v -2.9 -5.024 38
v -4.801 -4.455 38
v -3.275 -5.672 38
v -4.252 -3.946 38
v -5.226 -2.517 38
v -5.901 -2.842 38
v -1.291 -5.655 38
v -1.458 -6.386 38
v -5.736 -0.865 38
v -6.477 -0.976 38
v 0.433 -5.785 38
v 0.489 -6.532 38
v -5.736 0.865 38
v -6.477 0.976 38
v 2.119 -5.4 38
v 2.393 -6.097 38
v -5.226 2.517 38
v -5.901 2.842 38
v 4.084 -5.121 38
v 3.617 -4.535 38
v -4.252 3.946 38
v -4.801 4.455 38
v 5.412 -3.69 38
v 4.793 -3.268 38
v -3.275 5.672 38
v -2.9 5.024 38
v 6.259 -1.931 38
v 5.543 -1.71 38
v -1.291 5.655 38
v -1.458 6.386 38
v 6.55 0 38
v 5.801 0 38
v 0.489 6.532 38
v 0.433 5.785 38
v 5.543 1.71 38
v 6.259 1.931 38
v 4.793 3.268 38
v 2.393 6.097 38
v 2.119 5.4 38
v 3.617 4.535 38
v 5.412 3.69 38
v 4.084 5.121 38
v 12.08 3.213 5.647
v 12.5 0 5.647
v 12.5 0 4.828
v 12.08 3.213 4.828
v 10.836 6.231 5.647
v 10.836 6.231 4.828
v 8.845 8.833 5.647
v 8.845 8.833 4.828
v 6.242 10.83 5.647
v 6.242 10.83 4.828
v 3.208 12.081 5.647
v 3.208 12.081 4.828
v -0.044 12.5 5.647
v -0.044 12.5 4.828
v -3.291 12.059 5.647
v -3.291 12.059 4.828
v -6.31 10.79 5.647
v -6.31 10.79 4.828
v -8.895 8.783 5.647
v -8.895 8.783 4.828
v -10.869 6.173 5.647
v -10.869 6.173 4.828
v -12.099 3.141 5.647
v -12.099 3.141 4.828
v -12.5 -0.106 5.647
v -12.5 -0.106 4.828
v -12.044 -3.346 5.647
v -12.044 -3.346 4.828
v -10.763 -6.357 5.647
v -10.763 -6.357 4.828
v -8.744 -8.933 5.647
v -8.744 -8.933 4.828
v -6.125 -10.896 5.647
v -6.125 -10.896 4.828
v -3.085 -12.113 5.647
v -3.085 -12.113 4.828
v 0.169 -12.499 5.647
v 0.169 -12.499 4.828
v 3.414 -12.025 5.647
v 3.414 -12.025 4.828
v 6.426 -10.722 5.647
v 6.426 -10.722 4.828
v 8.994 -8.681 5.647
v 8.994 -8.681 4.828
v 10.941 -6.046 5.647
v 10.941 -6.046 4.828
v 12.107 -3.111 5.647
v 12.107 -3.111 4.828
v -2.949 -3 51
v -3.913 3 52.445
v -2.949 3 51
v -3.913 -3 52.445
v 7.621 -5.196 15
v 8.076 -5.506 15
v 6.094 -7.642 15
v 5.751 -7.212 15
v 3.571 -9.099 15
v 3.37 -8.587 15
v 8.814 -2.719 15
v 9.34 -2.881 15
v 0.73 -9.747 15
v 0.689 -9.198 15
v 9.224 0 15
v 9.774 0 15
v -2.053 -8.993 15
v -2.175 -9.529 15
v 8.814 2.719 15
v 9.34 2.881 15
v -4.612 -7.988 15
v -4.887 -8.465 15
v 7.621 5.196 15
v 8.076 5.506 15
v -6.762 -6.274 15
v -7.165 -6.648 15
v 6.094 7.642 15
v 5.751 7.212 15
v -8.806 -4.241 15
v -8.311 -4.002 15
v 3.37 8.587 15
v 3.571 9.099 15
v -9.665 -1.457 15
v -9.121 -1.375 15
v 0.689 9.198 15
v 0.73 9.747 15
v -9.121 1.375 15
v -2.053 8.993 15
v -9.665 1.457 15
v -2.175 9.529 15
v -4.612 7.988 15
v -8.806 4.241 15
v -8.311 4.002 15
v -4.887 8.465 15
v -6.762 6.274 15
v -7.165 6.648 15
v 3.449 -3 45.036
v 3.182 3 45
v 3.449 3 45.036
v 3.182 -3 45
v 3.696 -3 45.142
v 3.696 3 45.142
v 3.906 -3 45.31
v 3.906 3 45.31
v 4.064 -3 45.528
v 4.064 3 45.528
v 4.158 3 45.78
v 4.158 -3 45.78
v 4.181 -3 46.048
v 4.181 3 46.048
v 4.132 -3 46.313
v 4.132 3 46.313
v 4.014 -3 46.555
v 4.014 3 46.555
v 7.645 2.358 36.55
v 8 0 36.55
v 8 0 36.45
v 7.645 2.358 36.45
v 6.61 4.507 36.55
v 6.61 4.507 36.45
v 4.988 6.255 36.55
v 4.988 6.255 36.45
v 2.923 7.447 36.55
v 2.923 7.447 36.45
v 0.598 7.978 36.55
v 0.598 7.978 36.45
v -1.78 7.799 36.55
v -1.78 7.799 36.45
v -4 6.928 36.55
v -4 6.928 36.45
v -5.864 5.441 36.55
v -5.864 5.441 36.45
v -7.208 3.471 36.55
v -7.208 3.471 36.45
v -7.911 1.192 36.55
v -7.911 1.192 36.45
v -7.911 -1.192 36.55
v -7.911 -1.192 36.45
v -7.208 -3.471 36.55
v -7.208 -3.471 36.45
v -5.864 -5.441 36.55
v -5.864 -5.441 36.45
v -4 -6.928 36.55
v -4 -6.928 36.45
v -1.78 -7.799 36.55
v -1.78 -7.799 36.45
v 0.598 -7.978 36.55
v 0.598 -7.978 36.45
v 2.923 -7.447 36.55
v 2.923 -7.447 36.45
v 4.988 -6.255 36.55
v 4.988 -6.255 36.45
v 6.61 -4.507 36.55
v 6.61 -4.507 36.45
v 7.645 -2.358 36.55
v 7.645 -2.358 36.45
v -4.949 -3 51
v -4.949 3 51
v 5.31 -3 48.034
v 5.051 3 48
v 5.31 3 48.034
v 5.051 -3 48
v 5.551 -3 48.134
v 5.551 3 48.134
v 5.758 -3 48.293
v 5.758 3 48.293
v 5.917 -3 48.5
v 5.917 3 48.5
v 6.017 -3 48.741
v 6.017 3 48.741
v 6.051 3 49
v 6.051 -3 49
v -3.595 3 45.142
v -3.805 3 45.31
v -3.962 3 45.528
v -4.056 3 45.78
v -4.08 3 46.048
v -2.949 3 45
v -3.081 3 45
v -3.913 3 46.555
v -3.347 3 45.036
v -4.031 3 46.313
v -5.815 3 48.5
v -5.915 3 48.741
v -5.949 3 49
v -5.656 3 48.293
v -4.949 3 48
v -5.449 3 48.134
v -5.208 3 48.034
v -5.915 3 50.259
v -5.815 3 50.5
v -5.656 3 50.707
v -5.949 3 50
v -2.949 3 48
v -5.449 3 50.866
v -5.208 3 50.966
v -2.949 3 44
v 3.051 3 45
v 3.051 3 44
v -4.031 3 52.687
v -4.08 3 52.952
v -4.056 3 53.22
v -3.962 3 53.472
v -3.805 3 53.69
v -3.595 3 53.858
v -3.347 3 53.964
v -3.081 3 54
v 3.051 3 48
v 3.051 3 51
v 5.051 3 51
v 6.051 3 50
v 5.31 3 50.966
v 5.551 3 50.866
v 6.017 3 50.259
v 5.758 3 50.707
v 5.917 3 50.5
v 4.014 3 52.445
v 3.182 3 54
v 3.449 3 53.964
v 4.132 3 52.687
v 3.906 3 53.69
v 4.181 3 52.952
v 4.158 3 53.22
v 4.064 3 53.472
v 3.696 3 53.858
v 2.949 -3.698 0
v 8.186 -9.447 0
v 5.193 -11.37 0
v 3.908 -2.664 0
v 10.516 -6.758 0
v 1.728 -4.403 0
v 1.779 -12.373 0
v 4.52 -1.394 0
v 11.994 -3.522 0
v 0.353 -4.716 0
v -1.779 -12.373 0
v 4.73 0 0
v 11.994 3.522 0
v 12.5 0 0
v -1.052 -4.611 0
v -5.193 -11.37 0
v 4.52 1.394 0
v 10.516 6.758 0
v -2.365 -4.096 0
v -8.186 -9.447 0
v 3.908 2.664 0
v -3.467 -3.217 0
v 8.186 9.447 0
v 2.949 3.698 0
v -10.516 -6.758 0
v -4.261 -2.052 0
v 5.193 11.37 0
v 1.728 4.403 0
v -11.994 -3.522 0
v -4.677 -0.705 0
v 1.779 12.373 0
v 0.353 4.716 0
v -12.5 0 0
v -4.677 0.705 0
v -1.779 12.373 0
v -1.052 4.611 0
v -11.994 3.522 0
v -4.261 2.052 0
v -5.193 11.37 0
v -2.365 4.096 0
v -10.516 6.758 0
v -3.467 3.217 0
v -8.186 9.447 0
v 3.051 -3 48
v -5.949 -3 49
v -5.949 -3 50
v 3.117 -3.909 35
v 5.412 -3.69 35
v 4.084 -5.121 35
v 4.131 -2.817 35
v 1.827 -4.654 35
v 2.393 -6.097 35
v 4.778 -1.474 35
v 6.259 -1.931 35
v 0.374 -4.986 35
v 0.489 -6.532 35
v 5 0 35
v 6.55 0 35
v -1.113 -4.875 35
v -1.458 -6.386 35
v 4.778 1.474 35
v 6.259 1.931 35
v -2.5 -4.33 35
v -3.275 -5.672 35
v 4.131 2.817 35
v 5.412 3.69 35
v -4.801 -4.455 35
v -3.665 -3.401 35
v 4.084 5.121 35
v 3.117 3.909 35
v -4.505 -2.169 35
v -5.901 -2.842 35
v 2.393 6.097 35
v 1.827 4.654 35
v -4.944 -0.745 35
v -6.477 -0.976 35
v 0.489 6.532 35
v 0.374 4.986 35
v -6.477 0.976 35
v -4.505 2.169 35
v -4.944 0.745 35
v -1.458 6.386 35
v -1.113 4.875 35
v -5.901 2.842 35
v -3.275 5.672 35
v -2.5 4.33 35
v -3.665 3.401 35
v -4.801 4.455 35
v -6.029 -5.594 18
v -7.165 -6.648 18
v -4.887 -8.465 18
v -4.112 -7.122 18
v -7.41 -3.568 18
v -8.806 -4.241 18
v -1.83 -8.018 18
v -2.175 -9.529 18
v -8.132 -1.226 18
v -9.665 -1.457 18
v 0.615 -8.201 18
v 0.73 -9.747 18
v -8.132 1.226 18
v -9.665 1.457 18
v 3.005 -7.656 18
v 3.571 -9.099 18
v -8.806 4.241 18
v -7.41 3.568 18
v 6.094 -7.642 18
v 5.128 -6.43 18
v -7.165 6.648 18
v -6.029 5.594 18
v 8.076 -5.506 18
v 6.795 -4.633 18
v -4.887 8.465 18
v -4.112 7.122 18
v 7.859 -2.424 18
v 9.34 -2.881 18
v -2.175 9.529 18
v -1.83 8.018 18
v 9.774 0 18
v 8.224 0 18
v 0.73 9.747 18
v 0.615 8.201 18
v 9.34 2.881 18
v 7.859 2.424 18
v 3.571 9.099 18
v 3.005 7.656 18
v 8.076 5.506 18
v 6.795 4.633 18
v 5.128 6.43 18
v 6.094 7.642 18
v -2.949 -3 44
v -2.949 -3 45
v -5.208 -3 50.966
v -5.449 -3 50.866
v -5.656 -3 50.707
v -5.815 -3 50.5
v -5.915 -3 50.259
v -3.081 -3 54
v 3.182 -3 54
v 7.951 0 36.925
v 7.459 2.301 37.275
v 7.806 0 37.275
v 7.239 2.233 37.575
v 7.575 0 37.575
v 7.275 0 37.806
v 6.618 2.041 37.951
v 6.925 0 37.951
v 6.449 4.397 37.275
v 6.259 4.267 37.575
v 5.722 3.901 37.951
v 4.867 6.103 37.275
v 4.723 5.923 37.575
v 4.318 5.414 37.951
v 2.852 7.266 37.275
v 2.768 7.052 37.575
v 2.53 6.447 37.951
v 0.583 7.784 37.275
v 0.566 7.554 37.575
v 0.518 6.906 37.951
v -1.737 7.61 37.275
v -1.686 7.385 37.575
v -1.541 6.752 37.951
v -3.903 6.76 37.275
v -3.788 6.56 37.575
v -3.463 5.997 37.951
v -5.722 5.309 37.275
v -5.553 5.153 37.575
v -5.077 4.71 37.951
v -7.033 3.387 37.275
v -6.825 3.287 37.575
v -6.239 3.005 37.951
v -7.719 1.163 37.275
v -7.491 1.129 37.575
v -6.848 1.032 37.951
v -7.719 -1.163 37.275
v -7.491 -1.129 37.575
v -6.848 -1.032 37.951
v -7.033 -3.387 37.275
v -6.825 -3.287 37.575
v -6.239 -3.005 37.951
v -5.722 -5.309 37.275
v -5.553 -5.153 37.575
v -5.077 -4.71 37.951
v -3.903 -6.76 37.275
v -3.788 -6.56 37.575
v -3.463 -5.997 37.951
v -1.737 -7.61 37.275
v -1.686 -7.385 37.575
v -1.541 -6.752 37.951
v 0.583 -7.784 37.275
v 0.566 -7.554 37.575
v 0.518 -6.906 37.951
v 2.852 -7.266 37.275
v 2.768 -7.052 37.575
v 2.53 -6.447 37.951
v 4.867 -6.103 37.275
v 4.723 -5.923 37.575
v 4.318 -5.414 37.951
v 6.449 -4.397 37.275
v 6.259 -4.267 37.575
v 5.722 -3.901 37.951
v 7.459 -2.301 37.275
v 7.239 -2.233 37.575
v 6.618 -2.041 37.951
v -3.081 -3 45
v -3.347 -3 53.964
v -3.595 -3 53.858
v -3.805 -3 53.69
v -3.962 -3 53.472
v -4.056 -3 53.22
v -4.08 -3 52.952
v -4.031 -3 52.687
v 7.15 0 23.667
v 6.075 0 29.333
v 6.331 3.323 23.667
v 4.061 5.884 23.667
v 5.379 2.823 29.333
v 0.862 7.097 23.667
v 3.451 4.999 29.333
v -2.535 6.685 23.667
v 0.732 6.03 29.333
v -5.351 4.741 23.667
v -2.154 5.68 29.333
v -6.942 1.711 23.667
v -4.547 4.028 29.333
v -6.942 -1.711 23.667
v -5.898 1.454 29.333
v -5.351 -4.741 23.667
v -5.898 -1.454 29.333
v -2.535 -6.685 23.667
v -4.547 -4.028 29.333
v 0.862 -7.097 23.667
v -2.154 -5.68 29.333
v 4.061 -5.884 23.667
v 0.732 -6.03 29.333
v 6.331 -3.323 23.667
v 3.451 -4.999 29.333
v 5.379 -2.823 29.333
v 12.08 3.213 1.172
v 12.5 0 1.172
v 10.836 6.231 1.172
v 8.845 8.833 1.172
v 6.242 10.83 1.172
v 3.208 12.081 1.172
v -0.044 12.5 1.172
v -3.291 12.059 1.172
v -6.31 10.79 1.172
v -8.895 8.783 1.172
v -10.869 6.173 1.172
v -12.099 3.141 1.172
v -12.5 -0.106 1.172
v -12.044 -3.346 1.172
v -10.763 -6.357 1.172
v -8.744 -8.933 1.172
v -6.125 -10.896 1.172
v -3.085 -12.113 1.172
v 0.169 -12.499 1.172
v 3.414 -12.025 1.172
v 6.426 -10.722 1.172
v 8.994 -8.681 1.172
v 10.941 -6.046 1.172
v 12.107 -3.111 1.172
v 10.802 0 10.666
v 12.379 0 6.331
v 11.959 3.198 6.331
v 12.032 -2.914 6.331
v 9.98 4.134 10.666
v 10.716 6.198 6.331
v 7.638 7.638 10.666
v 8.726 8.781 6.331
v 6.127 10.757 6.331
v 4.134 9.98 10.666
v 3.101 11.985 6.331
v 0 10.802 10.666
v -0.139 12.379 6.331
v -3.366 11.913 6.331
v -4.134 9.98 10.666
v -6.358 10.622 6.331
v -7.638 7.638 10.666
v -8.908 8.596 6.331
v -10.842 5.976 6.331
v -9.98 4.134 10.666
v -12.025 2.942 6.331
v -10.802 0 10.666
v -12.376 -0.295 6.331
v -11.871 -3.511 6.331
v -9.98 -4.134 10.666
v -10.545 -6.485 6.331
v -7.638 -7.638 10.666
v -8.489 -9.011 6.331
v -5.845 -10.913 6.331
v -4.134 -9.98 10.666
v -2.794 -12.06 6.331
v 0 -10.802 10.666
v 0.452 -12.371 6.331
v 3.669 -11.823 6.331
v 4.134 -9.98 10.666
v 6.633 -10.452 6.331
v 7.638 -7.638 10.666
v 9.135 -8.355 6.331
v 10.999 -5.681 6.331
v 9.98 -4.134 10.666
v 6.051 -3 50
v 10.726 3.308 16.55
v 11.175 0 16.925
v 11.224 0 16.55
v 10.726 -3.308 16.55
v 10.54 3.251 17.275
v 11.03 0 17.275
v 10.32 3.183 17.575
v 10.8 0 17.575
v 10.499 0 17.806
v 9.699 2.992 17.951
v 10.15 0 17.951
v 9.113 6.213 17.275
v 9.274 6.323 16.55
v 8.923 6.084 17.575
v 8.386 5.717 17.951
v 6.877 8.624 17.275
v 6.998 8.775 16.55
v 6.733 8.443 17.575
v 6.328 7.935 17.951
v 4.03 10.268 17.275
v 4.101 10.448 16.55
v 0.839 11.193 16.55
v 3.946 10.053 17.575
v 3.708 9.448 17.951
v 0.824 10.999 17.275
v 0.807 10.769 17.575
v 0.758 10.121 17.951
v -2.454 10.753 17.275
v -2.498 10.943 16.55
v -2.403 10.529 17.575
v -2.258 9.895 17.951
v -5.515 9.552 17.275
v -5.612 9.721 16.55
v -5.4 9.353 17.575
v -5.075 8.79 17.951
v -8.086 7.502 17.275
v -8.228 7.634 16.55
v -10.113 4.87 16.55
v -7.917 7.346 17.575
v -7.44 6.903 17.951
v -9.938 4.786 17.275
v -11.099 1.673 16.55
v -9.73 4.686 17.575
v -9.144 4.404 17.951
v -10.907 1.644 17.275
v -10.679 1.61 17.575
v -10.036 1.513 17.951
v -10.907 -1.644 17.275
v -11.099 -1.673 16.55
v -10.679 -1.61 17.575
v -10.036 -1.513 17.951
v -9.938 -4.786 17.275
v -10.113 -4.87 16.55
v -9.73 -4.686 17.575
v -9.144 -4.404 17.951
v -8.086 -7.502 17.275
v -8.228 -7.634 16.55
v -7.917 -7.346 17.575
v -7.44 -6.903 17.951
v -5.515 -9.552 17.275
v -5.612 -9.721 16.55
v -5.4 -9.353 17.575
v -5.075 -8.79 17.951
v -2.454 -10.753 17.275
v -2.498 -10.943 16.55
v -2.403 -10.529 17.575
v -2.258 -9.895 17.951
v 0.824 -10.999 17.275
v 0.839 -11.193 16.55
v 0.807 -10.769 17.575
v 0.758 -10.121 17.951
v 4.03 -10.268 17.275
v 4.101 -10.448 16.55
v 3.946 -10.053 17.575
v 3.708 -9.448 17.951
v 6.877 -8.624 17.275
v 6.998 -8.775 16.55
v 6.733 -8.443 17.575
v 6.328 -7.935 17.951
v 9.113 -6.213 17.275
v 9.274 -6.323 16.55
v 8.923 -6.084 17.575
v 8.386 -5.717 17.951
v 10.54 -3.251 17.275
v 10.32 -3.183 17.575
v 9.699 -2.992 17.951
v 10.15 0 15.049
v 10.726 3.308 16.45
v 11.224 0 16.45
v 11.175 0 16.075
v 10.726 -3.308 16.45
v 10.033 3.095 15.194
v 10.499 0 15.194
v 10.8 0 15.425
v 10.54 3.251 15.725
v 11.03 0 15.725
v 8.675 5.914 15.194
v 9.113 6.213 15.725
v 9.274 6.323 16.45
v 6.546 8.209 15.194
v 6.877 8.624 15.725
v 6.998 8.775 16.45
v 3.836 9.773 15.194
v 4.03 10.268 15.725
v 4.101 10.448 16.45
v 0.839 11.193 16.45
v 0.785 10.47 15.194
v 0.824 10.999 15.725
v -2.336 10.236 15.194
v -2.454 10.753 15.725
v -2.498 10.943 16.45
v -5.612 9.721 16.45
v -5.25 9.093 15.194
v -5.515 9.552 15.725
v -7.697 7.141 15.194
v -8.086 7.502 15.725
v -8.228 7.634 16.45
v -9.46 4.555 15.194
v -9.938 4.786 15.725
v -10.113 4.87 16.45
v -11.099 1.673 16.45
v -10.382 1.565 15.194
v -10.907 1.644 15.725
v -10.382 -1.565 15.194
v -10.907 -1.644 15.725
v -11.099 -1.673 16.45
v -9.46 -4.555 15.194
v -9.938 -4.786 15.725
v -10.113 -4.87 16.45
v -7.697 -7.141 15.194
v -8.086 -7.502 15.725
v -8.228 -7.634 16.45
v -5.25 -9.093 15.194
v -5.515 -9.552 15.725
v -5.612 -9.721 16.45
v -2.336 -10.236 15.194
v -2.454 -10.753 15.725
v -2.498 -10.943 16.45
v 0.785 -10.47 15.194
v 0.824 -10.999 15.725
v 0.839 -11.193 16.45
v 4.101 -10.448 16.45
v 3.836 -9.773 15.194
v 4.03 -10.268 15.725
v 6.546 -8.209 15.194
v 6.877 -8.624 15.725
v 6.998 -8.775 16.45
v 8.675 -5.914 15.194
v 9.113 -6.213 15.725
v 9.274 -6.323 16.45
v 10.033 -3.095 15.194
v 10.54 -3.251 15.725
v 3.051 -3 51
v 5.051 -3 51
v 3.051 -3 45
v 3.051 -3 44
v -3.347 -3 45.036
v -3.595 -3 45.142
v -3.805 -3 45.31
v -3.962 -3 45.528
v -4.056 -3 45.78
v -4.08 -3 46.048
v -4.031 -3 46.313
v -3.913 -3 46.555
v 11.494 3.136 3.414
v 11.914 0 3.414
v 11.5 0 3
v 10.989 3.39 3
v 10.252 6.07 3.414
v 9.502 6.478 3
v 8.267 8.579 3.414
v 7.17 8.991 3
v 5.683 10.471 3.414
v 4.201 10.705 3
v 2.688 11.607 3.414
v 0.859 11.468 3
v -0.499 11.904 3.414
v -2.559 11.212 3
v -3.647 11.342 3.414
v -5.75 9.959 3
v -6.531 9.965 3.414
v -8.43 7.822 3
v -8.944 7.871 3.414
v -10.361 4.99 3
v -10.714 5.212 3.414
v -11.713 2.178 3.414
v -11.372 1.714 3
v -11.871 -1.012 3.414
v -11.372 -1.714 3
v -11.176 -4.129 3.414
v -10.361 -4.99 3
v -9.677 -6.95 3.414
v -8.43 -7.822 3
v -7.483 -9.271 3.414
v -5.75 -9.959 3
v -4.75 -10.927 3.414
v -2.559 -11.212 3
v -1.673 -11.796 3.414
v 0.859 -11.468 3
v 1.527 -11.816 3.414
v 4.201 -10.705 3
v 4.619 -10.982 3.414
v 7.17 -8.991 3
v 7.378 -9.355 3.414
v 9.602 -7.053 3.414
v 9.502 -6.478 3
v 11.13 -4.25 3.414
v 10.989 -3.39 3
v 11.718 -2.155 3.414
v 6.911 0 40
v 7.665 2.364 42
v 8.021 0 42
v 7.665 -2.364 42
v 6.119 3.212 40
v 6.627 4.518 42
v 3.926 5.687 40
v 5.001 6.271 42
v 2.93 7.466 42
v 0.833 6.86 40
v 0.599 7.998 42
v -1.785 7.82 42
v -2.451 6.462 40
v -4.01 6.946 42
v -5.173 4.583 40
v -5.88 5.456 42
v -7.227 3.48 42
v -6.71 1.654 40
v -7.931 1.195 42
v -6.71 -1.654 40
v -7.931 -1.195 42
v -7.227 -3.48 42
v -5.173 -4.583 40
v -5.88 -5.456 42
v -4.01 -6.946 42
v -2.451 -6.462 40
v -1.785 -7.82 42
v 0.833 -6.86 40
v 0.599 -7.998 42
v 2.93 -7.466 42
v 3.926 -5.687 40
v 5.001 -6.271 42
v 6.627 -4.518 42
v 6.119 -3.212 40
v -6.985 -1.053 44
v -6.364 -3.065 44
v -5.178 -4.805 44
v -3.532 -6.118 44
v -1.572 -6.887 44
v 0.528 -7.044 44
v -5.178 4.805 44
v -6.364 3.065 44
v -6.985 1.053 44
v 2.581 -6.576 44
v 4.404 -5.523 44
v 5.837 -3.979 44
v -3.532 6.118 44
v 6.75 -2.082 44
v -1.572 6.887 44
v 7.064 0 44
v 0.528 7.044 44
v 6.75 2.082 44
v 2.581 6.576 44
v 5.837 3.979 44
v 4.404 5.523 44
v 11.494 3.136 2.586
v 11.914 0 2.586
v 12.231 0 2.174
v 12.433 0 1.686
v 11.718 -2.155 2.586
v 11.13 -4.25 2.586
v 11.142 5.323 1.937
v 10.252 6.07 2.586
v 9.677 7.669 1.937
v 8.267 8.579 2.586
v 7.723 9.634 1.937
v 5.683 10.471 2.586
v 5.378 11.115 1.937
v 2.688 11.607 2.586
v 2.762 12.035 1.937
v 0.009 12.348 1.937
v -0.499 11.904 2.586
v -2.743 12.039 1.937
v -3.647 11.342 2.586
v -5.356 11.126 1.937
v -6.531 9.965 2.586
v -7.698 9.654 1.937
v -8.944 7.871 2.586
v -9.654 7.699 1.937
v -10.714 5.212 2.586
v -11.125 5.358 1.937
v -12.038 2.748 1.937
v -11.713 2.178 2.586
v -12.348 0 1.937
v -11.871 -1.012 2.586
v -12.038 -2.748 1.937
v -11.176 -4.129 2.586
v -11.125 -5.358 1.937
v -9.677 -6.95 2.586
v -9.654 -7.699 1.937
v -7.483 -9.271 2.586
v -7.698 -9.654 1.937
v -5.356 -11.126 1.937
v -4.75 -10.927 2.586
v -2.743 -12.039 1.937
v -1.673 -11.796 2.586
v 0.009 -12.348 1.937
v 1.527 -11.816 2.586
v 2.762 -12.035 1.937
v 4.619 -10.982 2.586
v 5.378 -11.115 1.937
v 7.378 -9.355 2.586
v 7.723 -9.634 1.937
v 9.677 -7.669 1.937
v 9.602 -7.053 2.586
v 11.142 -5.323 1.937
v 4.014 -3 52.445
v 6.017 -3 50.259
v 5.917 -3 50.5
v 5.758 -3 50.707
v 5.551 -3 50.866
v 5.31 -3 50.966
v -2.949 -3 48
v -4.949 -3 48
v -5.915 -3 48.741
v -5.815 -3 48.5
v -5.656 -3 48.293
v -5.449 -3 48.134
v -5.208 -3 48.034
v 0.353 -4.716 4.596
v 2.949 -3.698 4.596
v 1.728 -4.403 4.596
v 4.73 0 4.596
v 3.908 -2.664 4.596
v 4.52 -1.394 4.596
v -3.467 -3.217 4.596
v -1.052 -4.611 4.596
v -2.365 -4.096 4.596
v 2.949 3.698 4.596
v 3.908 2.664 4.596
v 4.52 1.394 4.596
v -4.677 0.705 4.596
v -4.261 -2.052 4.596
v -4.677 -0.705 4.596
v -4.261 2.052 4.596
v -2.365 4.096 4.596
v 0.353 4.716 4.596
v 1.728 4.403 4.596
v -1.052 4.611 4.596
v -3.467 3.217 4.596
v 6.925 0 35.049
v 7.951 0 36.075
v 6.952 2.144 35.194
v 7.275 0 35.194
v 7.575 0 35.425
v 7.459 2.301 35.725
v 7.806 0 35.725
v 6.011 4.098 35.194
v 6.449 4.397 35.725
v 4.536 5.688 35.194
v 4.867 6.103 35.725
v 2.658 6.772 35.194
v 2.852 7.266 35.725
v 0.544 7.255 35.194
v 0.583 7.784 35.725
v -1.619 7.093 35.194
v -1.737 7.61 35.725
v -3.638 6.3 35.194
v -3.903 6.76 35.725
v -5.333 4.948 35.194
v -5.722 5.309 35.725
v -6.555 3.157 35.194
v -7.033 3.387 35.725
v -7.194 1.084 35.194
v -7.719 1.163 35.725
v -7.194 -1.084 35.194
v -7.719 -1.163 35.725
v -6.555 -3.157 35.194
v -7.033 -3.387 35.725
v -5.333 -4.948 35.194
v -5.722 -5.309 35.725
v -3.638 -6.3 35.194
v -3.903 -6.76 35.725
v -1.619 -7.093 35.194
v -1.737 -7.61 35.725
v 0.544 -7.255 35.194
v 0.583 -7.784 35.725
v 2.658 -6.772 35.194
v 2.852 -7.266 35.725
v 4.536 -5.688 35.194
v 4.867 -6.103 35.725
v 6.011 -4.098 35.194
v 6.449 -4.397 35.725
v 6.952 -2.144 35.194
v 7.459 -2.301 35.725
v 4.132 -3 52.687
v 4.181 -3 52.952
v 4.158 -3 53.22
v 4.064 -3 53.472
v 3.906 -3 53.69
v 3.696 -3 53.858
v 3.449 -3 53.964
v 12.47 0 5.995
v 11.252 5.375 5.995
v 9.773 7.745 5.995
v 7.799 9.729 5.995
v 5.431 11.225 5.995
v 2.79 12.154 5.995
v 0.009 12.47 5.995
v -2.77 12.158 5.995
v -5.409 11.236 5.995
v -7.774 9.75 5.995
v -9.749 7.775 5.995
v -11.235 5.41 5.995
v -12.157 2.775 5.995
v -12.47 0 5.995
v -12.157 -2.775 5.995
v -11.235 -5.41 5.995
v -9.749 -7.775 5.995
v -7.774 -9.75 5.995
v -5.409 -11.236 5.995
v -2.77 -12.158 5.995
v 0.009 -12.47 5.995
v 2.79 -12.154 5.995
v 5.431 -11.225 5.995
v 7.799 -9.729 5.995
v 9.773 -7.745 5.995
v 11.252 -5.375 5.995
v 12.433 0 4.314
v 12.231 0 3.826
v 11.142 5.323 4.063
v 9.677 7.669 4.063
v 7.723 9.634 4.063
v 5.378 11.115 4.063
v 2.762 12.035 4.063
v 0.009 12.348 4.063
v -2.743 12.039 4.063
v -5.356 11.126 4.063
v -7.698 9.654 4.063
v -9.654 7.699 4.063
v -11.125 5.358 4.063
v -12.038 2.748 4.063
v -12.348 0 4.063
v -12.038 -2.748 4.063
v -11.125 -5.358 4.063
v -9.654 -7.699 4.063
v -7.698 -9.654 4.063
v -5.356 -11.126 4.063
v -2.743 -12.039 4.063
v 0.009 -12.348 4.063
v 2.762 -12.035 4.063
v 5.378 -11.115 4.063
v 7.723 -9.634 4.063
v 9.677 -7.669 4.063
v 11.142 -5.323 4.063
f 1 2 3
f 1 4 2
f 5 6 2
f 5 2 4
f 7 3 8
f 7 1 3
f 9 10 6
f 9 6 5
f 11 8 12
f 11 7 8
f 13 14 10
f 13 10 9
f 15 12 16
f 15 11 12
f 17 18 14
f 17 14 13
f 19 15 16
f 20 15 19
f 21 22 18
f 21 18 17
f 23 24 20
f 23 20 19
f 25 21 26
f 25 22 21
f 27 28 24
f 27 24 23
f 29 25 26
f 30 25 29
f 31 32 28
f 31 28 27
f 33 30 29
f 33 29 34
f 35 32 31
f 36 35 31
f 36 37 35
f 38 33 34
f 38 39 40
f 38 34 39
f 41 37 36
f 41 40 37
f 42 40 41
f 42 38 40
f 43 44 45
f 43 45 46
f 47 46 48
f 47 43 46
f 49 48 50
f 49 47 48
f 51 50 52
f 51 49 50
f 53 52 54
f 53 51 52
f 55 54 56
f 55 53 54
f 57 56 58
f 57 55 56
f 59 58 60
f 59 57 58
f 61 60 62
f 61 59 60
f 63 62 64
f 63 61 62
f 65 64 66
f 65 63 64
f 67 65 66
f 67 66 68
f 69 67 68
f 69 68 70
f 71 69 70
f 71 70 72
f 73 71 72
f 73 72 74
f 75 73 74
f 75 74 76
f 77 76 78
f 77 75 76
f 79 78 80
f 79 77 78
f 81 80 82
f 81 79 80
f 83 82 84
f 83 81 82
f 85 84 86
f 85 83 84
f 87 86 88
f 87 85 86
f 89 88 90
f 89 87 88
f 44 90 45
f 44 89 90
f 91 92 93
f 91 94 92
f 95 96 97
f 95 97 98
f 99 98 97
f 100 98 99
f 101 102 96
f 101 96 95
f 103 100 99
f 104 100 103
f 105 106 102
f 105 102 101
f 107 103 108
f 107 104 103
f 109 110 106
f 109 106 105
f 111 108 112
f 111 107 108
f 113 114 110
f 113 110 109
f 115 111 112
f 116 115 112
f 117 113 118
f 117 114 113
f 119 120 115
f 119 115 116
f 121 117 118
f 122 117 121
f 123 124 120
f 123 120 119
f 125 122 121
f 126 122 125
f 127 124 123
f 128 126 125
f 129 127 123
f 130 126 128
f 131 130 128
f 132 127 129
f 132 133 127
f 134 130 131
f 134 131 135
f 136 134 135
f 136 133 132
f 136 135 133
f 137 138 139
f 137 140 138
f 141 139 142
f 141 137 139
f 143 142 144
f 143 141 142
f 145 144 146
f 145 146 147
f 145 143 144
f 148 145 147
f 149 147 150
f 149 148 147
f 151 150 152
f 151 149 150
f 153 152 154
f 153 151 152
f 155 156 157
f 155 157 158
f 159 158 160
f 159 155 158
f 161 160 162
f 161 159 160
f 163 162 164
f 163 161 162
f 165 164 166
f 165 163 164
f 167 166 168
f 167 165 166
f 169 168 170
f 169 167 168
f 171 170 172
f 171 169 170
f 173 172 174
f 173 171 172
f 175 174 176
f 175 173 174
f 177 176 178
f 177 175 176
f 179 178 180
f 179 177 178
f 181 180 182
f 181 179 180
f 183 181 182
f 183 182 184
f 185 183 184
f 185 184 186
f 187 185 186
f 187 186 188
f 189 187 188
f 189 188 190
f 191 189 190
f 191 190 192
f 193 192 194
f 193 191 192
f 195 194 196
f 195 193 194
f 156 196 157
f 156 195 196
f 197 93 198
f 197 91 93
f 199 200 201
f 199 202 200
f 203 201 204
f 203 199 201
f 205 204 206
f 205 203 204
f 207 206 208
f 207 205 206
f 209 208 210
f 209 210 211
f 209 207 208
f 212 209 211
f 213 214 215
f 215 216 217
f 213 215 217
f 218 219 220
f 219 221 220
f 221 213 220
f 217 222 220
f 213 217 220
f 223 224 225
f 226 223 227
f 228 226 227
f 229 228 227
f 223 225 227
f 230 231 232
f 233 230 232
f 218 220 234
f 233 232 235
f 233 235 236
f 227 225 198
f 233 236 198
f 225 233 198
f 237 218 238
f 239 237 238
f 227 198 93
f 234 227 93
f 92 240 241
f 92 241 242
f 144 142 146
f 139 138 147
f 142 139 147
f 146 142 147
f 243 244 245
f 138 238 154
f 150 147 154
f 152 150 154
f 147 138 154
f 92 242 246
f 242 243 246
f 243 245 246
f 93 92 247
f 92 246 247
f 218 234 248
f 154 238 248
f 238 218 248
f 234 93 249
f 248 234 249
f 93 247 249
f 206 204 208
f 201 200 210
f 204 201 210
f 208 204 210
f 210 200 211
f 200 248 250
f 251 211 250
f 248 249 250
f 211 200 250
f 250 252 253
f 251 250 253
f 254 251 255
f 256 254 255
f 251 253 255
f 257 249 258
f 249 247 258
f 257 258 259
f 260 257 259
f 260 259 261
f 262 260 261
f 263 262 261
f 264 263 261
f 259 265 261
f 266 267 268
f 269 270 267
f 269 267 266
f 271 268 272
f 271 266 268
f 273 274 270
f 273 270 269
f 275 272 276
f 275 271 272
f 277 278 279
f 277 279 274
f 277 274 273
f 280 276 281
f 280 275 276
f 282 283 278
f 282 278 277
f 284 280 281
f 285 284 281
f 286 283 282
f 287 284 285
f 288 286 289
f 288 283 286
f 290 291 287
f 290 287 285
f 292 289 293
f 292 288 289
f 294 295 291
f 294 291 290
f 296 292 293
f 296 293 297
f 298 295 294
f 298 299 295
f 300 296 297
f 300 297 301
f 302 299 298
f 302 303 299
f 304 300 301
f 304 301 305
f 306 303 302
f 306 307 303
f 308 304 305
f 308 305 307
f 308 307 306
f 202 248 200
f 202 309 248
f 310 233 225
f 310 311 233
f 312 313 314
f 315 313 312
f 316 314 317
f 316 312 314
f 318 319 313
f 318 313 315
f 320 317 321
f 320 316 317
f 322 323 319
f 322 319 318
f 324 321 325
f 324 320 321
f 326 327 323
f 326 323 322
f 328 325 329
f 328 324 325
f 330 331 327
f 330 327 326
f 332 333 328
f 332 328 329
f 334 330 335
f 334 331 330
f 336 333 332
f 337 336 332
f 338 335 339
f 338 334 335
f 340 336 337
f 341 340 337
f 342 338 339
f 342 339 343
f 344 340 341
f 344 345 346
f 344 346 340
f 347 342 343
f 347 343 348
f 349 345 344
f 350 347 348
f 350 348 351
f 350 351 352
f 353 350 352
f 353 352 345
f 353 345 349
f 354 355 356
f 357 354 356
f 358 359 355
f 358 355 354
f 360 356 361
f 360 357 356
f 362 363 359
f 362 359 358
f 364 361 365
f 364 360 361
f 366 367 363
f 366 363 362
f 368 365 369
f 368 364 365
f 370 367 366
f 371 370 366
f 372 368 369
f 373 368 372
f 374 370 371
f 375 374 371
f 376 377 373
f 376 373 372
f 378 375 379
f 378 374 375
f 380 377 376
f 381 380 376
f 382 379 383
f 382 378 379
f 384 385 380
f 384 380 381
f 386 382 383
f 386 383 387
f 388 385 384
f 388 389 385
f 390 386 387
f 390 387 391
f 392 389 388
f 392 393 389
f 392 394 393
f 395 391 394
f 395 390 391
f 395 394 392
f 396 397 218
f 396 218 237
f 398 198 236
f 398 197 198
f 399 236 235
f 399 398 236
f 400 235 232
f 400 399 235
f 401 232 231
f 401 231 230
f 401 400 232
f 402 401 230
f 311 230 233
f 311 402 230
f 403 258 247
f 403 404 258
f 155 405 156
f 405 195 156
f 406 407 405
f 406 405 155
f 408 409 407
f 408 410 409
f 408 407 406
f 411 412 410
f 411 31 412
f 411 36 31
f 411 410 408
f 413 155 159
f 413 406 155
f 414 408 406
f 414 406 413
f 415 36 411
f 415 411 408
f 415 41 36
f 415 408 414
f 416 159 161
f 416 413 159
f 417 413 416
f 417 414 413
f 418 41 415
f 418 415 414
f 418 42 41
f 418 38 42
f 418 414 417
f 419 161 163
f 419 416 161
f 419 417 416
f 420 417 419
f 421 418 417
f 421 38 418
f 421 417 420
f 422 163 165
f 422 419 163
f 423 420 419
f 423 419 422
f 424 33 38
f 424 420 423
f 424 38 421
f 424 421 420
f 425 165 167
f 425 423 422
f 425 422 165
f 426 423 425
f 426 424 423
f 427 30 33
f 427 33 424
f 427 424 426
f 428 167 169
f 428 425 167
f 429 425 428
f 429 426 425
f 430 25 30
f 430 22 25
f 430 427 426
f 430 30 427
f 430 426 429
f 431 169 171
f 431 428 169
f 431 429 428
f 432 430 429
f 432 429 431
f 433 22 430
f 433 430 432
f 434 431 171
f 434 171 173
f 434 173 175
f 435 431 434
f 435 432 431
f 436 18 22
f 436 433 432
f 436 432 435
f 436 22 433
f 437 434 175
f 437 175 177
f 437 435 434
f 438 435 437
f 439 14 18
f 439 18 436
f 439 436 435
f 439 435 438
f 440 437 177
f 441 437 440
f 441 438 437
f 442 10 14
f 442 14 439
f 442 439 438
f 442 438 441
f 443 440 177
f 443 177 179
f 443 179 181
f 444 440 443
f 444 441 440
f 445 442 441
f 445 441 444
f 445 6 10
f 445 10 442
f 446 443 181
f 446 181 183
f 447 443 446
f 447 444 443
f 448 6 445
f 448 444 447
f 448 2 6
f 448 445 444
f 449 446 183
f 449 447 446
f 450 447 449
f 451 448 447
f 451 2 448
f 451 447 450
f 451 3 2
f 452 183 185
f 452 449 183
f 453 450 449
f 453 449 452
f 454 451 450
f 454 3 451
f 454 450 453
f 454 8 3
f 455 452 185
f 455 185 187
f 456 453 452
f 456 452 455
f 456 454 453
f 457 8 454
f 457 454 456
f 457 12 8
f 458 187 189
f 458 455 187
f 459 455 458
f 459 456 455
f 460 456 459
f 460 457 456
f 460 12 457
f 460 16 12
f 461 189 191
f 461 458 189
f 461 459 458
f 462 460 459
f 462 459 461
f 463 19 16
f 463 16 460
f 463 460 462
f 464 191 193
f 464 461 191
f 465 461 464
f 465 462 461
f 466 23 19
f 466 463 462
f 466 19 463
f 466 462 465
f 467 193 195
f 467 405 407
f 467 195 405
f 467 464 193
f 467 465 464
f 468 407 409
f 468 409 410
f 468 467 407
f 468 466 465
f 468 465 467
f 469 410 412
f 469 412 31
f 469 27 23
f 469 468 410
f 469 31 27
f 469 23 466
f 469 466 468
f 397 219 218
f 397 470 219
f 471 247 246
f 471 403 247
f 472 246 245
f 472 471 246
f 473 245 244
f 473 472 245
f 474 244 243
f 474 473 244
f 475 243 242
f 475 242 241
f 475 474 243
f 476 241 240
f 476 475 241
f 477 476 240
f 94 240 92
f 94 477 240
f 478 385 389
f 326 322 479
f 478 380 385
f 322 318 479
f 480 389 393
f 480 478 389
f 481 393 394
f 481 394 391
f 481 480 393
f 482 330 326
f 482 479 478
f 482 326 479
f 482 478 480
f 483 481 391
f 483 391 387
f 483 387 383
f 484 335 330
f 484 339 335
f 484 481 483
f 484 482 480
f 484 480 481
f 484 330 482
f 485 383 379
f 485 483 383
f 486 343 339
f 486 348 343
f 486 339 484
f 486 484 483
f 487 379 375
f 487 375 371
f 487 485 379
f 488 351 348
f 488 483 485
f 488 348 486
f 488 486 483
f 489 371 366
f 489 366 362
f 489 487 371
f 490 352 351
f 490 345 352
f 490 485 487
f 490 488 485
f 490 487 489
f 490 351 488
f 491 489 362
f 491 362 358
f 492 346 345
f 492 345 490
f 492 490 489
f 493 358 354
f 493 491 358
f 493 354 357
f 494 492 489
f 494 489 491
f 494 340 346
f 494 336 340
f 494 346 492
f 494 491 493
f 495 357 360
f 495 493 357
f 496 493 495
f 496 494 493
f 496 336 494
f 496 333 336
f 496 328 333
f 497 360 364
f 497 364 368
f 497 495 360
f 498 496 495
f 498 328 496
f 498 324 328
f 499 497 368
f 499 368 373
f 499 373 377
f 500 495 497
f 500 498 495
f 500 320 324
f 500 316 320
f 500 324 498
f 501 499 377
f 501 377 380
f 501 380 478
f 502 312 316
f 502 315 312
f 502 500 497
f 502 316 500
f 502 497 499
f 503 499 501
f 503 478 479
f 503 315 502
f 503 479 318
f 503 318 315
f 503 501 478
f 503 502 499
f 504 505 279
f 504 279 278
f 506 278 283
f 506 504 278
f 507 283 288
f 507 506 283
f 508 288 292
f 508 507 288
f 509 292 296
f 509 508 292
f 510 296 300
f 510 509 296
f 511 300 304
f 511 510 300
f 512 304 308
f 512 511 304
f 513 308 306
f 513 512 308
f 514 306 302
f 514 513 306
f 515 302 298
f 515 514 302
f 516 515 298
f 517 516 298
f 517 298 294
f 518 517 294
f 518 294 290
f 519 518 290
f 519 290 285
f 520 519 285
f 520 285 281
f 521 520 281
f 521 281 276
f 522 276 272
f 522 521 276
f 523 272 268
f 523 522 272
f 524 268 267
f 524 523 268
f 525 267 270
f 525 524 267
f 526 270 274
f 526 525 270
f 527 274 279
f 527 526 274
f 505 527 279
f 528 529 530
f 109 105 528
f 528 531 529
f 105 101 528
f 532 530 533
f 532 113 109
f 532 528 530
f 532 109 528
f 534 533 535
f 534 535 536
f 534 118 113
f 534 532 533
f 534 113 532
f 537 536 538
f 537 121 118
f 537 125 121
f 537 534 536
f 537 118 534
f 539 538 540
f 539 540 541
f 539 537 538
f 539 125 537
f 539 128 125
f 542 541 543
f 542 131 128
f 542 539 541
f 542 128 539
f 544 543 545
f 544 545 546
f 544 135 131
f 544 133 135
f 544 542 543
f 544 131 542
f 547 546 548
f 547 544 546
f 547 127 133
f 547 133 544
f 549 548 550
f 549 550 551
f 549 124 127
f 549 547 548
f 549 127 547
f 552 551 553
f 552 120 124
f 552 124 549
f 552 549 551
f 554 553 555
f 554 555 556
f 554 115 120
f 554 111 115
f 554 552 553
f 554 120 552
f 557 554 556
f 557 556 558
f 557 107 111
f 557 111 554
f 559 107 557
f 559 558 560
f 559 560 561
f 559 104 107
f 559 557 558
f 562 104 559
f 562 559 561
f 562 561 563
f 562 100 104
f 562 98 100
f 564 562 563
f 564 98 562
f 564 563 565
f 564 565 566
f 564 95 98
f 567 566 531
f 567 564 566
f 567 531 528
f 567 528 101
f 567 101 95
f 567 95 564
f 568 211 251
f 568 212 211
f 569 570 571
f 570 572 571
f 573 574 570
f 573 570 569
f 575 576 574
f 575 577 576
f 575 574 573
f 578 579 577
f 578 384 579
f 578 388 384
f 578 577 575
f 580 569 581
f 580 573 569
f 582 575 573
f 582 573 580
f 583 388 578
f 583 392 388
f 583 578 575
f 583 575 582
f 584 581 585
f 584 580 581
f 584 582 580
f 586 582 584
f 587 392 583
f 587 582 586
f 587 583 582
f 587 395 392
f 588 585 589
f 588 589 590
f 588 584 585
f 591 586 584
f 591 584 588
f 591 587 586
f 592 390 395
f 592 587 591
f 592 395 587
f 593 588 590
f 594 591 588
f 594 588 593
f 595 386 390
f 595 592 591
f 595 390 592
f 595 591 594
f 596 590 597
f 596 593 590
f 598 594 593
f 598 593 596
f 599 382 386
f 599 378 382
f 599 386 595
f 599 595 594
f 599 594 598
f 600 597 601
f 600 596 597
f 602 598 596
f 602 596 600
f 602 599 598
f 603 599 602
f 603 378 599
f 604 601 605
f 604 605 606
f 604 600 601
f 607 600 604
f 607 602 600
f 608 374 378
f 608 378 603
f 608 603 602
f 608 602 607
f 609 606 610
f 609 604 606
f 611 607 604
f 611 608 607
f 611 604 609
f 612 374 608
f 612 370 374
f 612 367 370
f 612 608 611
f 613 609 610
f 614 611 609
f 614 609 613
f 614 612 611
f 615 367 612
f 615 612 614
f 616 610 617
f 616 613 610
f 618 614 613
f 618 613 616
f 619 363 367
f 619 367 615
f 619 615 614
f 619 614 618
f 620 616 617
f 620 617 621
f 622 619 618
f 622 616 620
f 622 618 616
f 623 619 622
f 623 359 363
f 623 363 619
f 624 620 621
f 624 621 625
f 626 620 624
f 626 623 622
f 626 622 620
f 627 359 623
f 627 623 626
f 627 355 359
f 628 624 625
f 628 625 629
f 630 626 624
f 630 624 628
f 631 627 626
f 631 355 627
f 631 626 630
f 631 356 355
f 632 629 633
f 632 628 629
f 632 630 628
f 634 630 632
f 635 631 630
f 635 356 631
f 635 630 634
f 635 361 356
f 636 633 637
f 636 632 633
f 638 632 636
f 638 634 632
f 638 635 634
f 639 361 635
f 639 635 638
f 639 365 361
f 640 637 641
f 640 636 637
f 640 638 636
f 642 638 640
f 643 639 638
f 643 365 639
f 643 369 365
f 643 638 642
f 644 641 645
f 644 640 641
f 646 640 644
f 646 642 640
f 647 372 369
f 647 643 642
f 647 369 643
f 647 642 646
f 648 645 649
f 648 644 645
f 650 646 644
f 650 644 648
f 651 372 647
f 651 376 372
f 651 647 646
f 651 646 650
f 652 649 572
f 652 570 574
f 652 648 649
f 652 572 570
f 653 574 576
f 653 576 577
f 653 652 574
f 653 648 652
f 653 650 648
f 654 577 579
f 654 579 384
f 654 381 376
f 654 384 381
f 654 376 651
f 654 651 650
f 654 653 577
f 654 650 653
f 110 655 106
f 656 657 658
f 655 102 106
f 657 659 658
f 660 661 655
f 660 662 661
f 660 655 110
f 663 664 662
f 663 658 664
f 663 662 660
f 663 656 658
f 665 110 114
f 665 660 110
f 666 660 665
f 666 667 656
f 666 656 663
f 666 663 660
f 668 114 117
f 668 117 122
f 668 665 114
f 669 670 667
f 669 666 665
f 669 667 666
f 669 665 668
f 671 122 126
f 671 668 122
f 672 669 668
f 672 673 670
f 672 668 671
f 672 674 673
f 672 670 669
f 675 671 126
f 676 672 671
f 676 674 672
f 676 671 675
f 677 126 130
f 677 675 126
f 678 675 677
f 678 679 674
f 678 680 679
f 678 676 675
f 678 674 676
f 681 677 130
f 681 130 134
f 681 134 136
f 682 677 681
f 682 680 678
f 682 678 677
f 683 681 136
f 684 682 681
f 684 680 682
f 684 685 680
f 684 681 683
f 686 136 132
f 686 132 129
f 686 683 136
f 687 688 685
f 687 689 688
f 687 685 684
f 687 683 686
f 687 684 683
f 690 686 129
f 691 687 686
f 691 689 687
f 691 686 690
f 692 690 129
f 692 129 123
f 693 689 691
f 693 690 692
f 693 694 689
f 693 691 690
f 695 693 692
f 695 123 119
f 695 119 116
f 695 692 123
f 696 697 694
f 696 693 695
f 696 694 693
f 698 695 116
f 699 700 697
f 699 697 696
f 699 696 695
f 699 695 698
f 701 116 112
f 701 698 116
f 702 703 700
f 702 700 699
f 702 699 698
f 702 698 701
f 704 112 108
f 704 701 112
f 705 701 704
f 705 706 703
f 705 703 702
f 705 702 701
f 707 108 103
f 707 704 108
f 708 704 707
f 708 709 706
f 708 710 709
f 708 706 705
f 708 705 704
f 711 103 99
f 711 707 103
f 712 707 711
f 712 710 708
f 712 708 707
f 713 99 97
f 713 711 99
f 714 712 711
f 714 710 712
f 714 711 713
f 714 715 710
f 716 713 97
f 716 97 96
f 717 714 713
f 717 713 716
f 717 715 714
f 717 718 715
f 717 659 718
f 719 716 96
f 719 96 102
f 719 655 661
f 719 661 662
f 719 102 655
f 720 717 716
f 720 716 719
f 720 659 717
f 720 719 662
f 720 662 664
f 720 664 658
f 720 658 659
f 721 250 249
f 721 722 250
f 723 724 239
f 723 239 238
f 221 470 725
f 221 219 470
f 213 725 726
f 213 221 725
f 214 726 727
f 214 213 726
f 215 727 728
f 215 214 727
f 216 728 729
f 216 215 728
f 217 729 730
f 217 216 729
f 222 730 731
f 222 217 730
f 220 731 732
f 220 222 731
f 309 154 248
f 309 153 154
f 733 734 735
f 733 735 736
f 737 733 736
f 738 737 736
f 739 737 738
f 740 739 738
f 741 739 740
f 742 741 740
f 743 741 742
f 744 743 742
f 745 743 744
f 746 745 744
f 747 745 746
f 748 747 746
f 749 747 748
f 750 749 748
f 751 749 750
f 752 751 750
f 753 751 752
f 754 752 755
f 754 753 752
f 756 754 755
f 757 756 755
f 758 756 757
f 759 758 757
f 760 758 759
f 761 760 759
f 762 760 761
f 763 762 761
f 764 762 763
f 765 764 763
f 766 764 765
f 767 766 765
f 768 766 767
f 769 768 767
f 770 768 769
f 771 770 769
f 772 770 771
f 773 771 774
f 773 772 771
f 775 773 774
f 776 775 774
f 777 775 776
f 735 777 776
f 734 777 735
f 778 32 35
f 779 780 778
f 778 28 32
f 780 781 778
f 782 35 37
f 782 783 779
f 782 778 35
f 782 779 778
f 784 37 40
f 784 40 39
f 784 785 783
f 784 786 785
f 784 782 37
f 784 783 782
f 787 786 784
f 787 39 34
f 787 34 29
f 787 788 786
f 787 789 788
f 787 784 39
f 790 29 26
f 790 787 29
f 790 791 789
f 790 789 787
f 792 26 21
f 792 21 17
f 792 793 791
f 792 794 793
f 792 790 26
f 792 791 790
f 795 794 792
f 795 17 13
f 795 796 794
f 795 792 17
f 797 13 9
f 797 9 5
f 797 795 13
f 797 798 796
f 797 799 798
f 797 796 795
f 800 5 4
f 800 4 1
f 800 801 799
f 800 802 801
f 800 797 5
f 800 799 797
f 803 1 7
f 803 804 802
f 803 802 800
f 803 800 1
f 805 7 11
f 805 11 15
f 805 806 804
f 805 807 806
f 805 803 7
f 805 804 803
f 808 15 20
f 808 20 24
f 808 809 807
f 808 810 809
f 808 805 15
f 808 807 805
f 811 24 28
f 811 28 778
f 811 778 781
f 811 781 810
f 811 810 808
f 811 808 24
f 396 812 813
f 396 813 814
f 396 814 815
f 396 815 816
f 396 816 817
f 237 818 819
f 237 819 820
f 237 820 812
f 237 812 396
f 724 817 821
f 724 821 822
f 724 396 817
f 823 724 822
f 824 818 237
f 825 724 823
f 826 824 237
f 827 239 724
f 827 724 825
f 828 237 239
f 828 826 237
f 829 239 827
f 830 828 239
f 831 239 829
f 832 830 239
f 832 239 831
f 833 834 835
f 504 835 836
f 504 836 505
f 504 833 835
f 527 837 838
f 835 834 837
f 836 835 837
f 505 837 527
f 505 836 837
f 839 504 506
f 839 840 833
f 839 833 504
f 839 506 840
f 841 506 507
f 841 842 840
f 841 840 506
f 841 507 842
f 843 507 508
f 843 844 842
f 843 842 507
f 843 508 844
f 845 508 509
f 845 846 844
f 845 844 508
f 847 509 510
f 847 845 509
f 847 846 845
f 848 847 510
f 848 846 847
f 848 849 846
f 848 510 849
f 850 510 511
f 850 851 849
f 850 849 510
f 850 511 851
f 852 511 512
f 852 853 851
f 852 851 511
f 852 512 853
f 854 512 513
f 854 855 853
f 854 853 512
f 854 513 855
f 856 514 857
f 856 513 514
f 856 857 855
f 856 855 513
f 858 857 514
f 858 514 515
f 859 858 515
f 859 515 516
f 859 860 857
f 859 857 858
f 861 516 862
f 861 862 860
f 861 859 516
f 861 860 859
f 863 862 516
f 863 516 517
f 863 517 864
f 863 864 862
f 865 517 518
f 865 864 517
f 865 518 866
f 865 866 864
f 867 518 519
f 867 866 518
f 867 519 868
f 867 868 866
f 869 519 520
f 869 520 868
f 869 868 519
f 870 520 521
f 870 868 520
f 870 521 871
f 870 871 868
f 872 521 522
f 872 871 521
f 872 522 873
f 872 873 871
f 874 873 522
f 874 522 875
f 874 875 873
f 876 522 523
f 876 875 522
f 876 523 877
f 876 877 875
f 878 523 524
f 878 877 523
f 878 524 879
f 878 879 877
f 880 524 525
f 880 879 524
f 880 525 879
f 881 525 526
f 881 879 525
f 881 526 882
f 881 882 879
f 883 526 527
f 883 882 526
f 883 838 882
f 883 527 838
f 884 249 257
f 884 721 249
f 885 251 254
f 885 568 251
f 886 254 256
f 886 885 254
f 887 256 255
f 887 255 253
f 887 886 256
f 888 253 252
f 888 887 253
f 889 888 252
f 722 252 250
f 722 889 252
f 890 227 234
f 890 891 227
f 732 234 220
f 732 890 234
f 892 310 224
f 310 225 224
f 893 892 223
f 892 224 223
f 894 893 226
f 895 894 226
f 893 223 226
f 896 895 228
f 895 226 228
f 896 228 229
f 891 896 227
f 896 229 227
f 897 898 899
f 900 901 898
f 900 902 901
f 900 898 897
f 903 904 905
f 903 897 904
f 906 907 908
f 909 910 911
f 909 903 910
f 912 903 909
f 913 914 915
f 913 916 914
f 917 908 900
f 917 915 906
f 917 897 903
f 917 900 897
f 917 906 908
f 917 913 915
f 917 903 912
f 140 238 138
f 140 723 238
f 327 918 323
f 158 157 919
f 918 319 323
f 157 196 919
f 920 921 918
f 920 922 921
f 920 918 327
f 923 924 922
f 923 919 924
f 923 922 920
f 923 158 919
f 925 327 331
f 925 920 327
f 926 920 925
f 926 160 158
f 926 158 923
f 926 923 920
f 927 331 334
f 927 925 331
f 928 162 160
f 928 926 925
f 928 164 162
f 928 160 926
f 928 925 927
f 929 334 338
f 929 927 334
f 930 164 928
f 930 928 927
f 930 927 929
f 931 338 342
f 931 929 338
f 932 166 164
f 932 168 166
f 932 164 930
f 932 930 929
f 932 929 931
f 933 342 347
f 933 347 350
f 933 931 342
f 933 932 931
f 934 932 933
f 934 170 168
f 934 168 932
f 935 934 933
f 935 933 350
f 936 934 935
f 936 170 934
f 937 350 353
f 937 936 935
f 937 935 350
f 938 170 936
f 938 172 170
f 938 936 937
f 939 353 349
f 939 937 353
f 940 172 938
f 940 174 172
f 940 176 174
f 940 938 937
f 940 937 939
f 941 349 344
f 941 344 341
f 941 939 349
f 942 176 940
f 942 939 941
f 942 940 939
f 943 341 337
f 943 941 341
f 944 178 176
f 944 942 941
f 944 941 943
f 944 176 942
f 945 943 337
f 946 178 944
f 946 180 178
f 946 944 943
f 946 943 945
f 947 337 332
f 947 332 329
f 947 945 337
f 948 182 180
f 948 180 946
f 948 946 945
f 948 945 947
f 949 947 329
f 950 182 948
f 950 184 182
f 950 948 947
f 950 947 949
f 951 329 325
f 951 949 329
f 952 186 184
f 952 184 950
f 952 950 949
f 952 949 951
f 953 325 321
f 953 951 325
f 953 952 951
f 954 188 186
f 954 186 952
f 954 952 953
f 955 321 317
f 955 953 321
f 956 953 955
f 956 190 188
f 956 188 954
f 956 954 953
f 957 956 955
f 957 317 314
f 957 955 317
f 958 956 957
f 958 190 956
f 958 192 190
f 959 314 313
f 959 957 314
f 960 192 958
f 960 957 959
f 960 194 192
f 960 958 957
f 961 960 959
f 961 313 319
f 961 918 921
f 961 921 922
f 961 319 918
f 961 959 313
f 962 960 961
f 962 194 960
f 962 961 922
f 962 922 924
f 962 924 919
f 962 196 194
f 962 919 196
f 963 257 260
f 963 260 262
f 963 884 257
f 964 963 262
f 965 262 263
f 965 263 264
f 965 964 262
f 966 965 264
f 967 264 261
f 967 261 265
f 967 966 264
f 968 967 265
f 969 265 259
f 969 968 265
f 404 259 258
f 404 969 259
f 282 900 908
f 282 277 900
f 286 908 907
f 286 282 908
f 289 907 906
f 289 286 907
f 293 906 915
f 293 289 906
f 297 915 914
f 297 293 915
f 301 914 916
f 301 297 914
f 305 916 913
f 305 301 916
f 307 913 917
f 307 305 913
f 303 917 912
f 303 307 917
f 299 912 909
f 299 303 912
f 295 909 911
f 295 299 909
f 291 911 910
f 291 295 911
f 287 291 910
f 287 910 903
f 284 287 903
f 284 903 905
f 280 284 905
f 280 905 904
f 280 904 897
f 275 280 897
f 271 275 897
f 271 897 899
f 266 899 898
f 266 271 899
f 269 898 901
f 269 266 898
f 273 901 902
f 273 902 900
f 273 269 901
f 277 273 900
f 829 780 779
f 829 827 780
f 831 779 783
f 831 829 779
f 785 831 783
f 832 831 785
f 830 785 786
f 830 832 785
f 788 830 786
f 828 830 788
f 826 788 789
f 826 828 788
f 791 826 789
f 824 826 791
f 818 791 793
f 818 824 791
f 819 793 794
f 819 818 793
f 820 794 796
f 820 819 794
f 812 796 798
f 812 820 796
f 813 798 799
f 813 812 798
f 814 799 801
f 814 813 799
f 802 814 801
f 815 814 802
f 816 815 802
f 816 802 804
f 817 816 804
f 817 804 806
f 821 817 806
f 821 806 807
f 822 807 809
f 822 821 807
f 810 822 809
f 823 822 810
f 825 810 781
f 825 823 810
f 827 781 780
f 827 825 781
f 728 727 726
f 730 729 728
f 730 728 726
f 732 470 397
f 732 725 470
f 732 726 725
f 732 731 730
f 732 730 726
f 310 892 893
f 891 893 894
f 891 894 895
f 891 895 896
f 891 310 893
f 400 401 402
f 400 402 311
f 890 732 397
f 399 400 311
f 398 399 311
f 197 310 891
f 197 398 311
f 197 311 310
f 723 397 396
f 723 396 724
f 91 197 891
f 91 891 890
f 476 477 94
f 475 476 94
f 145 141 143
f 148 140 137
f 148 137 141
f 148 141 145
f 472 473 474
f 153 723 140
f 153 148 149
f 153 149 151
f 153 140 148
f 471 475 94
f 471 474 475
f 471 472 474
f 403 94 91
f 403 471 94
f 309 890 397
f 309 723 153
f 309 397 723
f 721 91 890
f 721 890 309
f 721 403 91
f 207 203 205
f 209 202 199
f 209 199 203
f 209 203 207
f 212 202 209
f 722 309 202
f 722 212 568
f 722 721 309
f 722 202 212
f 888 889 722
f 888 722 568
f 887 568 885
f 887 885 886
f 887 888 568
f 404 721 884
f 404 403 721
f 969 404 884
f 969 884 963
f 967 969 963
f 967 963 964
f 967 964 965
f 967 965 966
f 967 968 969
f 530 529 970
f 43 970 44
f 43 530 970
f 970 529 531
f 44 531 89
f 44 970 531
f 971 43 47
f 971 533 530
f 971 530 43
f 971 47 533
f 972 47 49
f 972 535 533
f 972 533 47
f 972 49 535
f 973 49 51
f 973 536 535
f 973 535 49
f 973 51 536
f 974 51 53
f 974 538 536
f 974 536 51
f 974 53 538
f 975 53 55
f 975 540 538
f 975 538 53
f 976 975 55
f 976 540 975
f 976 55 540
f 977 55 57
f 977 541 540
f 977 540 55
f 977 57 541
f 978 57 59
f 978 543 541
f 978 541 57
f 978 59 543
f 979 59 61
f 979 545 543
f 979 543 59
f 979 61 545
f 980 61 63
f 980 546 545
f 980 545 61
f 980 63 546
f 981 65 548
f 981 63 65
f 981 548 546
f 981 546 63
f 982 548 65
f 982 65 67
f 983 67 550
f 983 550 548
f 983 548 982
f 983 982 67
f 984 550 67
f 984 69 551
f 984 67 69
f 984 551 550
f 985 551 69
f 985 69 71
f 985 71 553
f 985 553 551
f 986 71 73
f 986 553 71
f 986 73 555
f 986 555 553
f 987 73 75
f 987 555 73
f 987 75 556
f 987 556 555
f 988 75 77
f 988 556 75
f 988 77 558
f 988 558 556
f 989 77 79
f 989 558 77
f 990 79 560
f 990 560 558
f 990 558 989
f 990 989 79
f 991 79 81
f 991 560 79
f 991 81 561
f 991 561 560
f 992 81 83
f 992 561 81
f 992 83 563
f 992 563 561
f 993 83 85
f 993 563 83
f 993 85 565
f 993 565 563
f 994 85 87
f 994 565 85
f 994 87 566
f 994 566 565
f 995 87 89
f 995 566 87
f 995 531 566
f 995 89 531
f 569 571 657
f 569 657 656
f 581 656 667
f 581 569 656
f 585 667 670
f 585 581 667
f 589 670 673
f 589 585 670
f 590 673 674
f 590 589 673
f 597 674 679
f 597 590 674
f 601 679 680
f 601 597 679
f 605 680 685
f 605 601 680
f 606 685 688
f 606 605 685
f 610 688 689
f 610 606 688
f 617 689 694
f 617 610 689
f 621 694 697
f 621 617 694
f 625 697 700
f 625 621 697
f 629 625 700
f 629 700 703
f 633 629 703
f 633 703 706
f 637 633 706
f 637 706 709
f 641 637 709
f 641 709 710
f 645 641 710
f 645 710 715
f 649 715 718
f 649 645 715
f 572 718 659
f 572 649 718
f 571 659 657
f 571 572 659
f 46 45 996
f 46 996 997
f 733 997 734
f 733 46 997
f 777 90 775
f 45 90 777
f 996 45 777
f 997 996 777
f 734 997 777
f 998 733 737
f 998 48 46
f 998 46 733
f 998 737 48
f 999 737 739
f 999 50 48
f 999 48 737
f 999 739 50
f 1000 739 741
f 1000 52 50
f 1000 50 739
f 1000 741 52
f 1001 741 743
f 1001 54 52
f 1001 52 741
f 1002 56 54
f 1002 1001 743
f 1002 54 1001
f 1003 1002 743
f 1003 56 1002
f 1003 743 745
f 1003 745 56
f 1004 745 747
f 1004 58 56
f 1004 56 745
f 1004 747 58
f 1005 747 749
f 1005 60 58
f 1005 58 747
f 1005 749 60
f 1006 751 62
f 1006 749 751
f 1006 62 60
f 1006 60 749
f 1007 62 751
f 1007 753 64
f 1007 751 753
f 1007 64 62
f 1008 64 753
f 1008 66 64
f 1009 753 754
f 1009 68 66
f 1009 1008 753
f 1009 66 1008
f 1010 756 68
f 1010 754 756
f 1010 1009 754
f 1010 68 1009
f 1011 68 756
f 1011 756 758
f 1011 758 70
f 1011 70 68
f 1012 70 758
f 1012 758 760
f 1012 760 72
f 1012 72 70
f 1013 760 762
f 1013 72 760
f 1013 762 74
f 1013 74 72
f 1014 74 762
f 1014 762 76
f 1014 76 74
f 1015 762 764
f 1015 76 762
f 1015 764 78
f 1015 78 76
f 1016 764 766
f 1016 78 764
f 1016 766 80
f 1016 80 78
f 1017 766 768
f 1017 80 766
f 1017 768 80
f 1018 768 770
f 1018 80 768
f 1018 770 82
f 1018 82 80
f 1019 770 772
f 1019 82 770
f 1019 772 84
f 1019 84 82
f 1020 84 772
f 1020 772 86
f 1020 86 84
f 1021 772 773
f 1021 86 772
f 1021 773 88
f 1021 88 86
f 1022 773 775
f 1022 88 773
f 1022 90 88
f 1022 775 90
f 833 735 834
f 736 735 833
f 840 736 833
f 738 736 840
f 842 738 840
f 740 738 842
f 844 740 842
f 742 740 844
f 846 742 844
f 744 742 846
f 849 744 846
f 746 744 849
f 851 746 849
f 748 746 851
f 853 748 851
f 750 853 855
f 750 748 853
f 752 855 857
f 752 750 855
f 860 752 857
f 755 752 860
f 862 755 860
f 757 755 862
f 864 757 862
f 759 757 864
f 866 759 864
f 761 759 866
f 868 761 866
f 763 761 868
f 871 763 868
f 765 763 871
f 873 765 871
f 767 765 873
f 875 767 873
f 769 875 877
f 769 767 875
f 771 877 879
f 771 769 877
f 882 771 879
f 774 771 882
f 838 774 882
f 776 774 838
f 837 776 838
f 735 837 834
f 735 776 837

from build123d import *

# Parameters (mm, degrees)
FILLET008_R  = 1.45
FILLET009_R  = 2
PAD002_DEPTH = 3
FILLET014_R  = 1


with BuildPart() as part:
    # Sketch004 → Revolution004 (revolve)
    with BuildSketch(Plane.XZ):
        Polygon((0, 4.595736), (4.729655, 4.595736), (4.729655, 0), (12.5, 0), (12.5, 2), (11.5, 3), (12.5, 4), (12.5, 6), (9.224268, 15), (11.224268, 15), (11.224268, 18), (8.224268, 18), (5, 35), (8, 35), (8, 38), (5.800735, 38), (8.020864, 42), (7.064007, 44), (0, 44), align=None)
    revolve(axis=Axis((0, 0, 0), (0, 0, 1)))

    # Fillet008
    fillet008_edges = [part.edges().sort_by_distance(p)[0] for p in [
        (-11.224268, 0, 18),
        (-11.224268, 0, 15),
        (-8, 0, 38),
        (-8, 0, 35),
    ]]
    fillet(fillet008_edges, radius=FILLET008_R)

    # Fillet009
    fillet009_edges = [part.edges().sort_by_distance(p)[0] for p in [
        (-12.5, 0, 6),
        (-12.5, 0, 4),
        (-12.5, 0, 2),
    ]]
    fillet(fillet009_edges, radius=FILLET009_R)

    # Sketch011 → Pad002 (new body, symmetric)
    with BuildSketch(Plane.XZ):
        Polygon((-4.949239, 45), (-2.949239, 45), (-2.949239, 44), (3.050761, 44), (3.050761, 45), (5.050761, 45), (3.050761, 48), (6.050761, 48), (6.050761, 51), (3.050761, 51), (5.050761, 54), (-4.949239, 54), (-2.949239, 51), (-5.949239, 51), (-5.949239, 48), (-2.949239, 48), align=None)
    extrude(amount=PAD002_DEPTH, both=True)

    # Fillet014
    fillet014_edges = [part.edges().sort_by_distance(p)[0] for p in [
        (-4.949239, 0, 45),
        (-5.949239, 0, 48),
        (-5.949239, 0, 51),
        (-4.949239, 0, 54),
        (5.050761, 0, 54),
        (6.050761, 0, 51),
        (6.050761, 0, 48),
        (5.050761, 0, 45),
    ]]
    fillet(fillet014_edges, radius=FILLET014_R)


solid = part.part
